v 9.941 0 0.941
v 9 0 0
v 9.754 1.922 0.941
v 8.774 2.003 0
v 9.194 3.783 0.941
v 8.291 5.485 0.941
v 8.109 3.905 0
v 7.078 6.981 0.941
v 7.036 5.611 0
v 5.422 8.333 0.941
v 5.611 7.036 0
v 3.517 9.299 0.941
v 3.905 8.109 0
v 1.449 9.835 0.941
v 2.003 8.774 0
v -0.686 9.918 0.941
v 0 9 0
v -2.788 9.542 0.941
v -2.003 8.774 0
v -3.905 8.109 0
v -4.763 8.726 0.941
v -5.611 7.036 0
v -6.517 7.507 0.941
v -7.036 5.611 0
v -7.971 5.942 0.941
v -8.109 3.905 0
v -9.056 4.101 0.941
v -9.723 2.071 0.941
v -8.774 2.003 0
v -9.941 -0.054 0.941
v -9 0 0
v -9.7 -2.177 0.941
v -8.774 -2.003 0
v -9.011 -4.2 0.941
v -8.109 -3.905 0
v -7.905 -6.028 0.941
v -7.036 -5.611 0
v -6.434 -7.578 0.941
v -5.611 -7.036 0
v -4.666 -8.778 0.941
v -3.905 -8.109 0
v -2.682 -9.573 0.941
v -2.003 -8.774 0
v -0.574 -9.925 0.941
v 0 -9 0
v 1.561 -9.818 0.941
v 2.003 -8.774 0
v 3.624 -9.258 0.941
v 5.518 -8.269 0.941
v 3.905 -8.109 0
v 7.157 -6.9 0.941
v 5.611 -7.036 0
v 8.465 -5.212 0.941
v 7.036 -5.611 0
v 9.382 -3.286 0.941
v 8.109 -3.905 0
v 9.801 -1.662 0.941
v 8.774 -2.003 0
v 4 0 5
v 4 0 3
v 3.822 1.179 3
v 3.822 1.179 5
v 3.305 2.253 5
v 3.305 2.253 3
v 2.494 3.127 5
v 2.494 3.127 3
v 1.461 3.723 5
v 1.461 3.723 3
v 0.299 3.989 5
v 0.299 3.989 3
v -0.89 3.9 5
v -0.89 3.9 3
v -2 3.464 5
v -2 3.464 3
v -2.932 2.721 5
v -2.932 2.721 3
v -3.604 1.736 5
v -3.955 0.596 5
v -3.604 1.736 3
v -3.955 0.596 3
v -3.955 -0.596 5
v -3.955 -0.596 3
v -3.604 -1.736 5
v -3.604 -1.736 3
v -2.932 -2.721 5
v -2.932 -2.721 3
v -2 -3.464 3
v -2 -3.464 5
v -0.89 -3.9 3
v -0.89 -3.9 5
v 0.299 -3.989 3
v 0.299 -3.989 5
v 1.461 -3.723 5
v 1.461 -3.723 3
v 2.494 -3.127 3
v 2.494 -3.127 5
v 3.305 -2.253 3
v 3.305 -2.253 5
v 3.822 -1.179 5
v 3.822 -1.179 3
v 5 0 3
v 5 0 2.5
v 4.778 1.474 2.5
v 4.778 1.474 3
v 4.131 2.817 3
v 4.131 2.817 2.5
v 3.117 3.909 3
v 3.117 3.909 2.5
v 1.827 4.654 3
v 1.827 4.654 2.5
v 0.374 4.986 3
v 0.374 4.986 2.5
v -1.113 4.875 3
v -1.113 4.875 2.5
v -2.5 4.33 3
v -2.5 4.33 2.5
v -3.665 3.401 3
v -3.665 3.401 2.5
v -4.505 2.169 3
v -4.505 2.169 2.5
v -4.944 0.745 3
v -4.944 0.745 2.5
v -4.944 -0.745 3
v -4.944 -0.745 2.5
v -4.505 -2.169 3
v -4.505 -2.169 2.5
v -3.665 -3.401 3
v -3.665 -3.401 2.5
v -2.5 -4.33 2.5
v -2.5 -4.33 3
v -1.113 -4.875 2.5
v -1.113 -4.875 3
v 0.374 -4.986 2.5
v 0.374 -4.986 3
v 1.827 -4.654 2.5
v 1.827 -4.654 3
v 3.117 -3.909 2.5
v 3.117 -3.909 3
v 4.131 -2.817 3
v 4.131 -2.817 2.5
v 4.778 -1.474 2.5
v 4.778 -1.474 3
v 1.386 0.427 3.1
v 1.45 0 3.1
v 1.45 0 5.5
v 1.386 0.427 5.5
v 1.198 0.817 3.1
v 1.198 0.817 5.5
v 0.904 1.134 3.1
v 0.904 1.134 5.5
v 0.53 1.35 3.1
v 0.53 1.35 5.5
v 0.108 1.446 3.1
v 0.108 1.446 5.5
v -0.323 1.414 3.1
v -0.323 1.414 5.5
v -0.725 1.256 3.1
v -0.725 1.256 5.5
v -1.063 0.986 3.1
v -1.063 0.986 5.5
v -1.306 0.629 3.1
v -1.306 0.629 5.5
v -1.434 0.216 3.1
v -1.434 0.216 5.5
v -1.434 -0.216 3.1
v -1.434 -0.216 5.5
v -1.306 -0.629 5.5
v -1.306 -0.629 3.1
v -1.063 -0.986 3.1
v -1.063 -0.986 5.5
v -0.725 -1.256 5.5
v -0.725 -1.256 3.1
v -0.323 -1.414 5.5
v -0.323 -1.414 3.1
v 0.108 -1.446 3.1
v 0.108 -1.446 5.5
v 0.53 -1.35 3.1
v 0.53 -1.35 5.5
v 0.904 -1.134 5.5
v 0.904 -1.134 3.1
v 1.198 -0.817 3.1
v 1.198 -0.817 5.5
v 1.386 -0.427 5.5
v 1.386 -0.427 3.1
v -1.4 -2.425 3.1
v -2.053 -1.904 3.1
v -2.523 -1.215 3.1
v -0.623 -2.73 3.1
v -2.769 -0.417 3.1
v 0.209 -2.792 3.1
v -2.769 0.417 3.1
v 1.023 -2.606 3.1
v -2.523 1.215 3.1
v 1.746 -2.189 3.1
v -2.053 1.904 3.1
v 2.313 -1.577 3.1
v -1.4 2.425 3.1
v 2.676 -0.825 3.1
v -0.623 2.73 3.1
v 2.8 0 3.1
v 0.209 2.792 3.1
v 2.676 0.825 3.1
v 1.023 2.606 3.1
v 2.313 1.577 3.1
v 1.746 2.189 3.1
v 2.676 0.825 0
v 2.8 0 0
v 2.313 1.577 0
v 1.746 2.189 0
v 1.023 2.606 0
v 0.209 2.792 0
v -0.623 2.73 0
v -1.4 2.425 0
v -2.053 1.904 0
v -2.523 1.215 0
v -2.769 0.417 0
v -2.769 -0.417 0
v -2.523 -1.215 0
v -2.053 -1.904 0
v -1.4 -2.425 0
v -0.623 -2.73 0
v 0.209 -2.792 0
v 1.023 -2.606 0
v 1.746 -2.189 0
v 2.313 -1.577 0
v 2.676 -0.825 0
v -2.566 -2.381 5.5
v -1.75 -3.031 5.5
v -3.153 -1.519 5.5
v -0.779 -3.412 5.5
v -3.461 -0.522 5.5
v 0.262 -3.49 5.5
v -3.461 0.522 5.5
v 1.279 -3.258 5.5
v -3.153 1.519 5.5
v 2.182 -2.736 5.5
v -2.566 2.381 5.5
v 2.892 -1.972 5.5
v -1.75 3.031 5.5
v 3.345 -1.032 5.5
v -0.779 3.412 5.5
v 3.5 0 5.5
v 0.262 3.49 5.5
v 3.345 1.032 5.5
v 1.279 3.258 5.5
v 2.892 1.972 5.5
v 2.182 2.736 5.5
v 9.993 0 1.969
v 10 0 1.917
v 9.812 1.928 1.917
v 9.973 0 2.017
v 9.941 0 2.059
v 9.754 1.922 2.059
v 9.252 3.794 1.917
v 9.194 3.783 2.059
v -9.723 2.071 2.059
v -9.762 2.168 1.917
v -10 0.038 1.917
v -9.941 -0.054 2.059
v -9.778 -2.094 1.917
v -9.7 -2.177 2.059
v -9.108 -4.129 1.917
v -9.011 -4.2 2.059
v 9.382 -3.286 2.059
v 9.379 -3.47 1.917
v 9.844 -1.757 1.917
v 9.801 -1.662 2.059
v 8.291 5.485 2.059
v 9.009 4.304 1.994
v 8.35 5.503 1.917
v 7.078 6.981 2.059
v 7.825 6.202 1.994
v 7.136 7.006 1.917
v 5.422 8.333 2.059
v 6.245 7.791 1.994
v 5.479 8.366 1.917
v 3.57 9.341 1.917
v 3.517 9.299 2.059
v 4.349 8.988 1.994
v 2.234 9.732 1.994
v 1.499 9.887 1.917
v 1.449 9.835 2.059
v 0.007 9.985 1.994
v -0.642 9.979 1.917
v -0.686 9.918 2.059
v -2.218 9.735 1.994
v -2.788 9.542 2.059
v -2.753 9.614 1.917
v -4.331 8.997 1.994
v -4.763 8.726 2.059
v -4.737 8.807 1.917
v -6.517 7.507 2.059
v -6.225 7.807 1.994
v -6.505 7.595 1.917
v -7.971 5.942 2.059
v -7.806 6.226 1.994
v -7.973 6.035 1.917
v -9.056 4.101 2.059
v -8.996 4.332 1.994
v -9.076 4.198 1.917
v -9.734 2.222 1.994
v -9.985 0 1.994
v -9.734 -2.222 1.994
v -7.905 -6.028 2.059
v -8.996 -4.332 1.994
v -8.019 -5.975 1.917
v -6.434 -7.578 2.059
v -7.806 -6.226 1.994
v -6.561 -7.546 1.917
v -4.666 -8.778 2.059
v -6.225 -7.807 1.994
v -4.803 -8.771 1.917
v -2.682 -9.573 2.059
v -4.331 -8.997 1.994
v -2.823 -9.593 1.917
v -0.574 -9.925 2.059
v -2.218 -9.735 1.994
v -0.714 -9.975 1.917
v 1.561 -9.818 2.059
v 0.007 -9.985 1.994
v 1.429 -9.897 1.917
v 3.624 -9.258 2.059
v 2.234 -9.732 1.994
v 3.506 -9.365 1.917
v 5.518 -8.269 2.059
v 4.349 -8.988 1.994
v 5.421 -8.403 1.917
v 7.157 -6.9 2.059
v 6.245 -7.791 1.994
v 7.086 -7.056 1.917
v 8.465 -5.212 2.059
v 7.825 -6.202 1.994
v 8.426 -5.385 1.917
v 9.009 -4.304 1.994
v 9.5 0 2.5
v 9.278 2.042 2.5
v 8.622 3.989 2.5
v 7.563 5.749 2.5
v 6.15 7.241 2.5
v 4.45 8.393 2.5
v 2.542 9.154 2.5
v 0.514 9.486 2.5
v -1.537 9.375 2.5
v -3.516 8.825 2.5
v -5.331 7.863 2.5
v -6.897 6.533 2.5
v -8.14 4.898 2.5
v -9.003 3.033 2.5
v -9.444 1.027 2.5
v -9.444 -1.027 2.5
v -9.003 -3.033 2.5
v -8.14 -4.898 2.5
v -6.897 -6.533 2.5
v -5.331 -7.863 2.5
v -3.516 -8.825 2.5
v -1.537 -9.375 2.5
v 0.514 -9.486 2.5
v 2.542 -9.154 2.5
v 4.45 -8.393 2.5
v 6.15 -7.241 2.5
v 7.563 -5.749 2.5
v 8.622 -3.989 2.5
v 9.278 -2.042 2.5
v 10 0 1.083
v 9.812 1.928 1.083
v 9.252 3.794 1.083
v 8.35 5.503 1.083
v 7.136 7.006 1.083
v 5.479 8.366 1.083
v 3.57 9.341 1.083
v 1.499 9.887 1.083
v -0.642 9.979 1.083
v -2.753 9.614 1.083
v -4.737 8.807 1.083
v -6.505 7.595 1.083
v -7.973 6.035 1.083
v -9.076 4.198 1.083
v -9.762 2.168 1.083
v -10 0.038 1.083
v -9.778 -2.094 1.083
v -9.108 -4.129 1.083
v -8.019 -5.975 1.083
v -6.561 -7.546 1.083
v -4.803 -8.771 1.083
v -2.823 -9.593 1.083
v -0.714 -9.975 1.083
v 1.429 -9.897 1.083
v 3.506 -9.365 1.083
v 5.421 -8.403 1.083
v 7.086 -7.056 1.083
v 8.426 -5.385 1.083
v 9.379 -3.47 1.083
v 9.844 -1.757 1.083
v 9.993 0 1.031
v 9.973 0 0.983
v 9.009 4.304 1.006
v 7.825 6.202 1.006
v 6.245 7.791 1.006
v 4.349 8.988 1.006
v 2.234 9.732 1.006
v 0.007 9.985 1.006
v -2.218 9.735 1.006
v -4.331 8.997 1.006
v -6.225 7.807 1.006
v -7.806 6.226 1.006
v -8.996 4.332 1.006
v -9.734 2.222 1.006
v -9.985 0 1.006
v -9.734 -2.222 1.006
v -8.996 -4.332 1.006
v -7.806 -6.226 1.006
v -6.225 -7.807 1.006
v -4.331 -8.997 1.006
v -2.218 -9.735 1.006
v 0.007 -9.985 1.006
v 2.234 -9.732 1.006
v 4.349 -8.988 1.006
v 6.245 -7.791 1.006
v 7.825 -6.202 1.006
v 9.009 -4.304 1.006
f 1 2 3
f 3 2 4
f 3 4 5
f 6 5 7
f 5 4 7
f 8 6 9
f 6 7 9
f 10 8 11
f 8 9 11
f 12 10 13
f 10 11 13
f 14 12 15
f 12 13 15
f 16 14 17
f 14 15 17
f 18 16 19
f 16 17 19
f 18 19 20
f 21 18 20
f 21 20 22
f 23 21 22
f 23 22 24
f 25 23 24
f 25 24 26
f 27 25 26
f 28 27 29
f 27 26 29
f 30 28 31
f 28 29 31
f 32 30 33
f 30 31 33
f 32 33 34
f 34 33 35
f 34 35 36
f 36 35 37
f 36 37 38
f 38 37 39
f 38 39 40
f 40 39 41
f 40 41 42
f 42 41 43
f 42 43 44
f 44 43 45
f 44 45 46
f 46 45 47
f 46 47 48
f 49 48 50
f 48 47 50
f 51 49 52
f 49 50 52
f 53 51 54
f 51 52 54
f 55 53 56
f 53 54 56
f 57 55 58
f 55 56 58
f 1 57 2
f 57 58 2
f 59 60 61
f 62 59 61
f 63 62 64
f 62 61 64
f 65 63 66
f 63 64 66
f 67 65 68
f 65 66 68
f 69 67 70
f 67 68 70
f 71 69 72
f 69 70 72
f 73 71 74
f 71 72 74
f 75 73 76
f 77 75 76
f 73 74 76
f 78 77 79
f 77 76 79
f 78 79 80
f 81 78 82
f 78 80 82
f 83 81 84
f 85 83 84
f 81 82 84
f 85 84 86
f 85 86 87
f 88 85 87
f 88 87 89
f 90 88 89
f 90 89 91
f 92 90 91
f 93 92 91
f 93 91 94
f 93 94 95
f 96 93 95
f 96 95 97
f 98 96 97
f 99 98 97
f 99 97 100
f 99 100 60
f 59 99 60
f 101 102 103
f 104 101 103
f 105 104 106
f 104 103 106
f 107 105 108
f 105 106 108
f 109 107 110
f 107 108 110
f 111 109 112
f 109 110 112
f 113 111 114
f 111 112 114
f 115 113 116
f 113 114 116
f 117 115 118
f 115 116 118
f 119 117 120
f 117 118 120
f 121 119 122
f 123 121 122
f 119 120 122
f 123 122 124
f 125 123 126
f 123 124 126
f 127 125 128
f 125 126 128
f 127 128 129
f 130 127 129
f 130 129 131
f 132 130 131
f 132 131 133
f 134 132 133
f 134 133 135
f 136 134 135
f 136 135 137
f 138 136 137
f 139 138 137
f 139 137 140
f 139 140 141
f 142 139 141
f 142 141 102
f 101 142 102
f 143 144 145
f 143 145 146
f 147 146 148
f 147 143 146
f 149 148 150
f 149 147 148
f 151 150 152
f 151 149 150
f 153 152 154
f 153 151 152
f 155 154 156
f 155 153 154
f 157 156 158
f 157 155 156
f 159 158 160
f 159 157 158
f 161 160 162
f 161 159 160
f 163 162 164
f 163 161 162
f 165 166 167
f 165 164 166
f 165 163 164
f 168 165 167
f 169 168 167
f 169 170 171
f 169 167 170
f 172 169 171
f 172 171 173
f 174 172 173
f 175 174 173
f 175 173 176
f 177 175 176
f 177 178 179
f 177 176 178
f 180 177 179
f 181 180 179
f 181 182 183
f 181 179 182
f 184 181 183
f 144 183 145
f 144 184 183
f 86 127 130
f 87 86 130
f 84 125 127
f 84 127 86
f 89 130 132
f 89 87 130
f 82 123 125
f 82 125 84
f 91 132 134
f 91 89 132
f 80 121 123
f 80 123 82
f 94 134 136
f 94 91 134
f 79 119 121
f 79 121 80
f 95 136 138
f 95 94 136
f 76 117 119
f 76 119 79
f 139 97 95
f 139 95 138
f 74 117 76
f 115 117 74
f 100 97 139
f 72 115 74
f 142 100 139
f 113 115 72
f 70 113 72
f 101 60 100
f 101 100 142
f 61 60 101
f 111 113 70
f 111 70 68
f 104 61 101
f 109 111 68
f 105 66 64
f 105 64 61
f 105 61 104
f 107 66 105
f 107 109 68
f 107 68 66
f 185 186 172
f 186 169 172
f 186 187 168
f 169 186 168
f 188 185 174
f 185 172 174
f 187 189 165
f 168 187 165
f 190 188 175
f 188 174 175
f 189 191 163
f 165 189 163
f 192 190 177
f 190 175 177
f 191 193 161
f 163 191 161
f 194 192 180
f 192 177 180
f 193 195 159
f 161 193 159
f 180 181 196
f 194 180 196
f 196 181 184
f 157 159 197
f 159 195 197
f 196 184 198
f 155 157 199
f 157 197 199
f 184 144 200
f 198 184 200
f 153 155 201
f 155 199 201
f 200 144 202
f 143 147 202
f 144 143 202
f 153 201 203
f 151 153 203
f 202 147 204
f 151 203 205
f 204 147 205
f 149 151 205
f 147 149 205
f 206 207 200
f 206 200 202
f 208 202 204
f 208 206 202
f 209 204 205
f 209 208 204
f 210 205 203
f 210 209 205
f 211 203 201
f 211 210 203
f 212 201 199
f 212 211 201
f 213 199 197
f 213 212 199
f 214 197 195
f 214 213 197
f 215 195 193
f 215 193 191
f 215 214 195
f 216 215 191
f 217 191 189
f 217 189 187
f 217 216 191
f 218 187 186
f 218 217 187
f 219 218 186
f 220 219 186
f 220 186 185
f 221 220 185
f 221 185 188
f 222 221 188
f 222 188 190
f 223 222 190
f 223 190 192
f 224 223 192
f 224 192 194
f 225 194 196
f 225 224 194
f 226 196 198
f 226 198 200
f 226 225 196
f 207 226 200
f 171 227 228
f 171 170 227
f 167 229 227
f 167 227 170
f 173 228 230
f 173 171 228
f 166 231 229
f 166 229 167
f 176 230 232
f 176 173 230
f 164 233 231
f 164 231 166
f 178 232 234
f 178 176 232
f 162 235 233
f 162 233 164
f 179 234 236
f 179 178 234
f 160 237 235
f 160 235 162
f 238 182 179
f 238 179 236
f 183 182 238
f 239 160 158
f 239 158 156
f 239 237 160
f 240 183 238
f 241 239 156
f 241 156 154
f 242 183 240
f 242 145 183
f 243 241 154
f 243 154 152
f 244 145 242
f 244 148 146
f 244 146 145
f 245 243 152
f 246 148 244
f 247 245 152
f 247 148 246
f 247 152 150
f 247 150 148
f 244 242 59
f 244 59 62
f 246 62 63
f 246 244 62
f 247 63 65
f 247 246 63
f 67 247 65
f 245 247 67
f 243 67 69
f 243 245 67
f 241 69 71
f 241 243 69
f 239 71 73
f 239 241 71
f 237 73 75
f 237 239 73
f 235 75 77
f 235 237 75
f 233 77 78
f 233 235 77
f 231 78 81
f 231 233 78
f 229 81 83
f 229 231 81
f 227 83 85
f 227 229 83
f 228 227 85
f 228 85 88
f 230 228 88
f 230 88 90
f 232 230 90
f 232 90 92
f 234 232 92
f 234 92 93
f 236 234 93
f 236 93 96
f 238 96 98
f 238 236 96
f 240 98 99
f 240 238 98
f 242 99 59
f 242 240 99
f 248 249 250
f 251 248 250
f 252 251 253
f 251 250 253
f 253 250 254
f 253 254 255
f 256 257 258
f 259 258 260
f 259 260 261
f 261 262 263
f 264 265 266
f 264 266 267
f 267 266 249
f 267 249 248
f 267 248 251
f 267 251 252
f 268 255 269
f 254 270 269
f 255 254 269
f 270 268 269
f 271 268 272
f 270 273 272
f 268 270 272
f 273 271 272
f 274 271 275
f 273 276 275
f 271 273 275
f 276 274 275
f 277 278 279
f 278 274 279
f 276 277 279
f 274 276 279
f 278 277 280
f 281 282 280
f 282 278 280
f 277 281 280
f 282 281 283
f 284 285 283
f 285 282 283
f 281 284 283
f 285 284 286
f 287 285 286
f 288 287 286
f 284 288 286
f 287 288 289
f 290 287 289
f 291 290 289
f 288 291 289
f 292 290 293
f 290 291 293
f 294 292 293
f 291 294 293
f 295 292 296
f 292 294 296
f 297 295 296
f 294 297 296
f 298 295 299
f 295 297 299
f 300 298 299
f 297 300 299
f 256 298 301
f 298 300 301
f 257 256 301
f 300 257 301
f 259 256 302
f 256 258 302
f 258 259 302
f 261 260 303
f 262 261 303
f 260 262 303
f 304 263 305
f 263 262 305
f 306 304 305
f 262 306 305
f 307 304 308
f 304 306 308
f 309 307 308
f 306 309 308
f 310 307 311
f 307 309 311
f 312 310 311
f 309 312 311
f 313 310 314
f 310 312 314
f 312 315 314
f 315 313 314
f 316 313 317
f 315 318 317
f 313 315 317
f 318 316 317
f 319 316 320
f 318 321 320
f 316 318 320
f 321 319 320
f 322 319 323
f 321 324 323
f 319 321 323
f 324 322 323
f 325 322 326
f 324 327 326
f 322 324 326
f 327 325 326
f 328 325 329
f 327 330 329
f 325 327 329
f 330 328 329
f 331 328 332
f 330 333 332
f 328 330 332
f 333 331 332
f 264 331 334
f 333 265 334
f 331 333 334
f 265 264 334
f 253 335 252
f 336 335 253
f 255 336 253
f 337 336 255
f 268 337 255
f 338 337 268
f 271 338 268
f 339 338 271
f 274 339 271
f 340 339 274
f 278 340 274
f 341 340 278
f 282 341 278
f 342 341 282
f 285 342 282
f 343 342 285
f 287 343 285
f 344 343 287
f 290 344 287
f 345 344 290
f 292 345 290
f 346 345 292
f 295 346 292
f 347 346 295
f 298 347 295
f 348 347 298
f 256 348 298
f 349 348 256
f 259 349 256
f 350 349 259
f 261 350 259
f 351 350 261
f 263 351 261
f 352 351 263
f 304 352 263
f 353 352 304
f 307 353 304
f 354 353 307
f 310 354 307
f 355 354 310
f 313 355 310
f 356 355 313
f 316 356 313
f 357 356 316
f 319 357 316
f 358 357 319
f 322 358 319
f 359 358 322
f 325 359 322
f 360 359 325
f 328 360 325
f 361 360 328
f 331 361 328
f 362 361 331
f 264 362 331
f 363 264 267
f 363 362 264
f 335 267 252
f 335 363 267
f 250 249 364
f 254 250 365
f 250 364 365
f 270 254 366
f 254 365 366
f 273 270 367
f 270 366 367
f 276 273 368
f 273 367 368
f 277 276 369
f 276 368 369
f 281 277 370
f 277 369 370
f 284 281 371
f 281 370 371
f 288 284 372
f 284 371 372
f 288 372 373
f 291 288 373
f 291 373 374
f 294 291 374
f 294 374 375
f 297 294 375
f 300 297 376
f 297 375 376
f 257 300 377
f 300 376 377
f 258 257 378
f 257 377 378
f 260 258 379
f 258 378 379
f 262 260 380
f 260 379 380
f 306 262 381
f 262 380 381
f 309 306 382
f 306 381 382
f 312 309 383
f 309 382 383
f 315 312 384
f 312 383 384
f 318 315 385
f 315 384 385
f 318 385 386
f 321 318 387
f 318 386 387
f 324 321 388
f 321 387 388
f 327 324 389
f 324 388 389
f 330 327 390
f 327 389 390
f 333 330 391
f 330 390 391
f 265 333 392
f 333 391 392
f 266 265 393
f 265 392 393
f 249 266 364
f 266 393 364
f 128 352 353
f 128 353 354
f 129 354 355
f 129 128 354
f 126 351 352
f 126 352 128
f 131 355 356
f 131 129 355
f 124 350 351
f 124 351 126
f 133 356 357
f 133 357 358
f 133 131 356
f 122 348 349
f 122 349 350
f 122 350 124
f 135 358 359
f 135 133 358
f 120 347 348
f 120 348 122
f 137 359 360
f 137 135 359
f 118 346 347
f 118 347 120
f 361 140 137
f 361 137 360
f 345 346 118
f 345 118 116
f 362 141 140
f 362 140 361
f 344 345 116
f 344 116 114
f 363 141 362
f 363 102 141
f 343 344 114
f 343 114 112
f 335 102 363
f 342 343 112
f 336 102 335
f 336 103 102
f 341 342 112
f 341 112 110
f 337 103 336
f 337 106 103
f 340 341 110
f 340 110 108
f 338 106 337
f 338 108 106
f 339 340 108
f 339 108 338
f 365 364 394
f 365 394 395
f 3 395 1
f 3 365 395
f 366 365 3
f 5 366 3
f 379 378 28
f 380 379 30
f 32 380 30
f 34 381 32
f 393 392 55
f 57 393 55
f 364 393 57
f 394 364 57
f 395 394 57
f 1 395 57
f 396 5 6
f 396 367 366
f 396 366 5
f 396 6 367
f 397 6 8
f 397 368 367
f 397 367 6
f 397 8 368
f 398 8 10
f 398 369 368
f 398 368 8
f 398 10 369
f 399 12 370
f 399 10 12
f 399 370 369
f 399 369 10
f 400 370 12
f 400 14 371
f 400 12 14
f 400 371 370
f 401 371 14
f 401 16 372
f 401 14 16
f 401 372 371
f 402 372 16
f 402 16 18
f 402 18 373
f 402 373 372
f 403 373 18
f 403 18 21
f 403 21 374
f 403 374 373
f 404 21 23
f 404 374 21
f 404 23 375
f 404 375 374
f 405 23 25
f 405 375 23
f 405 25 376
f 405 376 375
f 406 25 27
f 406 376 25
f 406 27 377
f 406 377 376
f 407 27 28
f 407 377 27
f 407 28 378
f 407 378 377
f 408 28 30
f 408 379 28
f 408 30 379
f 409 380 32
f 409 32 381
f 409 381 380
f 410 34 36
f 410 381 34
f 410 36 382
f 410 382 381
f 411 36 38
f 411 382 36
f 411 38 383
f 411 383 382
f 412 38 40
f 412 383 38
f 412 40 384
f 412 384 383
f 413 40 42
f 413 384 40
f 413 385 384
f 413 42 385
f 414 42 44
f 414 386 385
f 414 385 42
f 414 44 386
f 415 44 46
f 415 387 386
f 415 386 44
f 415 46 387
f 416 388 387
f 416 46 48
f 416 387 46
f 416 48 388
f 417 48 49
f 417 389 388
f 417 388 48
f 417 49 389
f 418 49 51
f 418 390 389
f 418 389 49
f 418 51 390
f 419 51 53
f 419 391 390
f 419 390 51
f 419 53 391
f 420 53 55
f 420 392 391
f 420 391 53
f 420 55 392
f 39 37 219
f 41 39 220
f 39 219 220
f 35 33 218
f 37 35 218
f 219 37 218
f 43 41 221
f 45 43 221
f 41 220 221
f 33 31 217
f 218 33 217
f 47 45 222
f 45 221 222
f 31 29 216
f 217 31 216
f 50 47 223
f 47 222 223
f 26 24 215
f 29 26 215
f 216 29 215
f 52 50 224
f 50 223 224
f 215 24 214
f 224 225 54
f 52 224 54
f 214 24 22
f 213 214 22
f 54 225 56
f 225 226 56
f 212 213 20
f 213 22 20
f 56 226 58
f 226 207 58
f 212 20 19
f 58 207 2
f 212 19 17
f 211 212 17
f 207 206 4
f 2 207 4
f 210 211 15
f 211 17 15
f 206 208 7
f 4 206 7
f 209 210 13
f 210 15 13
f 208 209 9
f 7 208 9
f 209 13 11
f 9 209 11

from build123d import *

# Parameters (mm, degrees)
F0_R      = 4
F1_DEPTH  = 5.5
F2_R      = 5
F3_DEPTH  = 3
F4_R      = 10
F5_DEPTH  = 2.5
F6_SIZE   = 1
F7_SIZE   = 0.5
F8_R      = 0.2
F9_SIZE   = 0.5
F11_R     = 2.8
F12_DEPTH = 3.1
F13_R     = 1.45
F14_DEPTH = 8.4


with BuildPart() as f1:
    # F0 (on Top) → F1 (new body)
    with BuildSketch(Plane.XY):
        Circle(F0_R)
    extrude(amount=F1_DEPTH)

    # F2 (on Top) → F3 (join)
    with BuildSketch(Plane.XY):
        Circle(F2_R)
    extrude(amount=F3_DEPTH)

    # F4 (on Top) → F5 (join)
    with BuildSketch(Plane.XY):
        Circle(F4_R)
    extrude(amount=F5_DEPTH)

    # F6
    f6_edges = [f1.edges().sort_by_distance(p)[0] for p in [
        (-10, 0, 0),
    ]]
    chamfer(f6_edges, length=F6_SIZE)

    # F7
    f7_edges = [f1.edges().sort_by_distance(p)[0] for p in [
        (-10, 0, 2.5),
    ]]
    chamfer(f7_edges, length=F7_SIZE)

    # F8
    f8_edges = [f1.edges().sort_by_distance(p)[0] for p in [
        (-10, 0, 1),
        (-10, 0, 2),
    ]]
    fillet(f8_edges, radius=F8_R)

    # F9
    f9_edges = [f1.edges().sort_by_distance(p)[0] for p in [
        (-4, 0, 5.5),
    ]]
    chamfer(f9_edges, length=F9_SIZE)


with BuildPart() as f10_1:
    # F10: copy of F1
    add(f1.part.moved(Location((-25, 0, 0))))


with BuildPart() as f1_1:
    add(f1.part)

    # F11 (on Top) → F12 (cut)
    with BuildSketch(Plane.XY):
        Circle(F11_R)
    extrude(amount=F12_DEPTH, mode=Mode.SUBTRACT)

    # F13 (on Top) → F14 (cut)
    with BuildSketch(Plane.XY):
        Circle(F13_R)
    extrude(amount=F14_DEPTH, mode=Mode.SUBTRACT)


with BuildPart() as f16_1:
    # F16: copy of F1
    add(f1_1.part.moved(Location((-23.4, 0, 0))))


solid = f1_1.part
